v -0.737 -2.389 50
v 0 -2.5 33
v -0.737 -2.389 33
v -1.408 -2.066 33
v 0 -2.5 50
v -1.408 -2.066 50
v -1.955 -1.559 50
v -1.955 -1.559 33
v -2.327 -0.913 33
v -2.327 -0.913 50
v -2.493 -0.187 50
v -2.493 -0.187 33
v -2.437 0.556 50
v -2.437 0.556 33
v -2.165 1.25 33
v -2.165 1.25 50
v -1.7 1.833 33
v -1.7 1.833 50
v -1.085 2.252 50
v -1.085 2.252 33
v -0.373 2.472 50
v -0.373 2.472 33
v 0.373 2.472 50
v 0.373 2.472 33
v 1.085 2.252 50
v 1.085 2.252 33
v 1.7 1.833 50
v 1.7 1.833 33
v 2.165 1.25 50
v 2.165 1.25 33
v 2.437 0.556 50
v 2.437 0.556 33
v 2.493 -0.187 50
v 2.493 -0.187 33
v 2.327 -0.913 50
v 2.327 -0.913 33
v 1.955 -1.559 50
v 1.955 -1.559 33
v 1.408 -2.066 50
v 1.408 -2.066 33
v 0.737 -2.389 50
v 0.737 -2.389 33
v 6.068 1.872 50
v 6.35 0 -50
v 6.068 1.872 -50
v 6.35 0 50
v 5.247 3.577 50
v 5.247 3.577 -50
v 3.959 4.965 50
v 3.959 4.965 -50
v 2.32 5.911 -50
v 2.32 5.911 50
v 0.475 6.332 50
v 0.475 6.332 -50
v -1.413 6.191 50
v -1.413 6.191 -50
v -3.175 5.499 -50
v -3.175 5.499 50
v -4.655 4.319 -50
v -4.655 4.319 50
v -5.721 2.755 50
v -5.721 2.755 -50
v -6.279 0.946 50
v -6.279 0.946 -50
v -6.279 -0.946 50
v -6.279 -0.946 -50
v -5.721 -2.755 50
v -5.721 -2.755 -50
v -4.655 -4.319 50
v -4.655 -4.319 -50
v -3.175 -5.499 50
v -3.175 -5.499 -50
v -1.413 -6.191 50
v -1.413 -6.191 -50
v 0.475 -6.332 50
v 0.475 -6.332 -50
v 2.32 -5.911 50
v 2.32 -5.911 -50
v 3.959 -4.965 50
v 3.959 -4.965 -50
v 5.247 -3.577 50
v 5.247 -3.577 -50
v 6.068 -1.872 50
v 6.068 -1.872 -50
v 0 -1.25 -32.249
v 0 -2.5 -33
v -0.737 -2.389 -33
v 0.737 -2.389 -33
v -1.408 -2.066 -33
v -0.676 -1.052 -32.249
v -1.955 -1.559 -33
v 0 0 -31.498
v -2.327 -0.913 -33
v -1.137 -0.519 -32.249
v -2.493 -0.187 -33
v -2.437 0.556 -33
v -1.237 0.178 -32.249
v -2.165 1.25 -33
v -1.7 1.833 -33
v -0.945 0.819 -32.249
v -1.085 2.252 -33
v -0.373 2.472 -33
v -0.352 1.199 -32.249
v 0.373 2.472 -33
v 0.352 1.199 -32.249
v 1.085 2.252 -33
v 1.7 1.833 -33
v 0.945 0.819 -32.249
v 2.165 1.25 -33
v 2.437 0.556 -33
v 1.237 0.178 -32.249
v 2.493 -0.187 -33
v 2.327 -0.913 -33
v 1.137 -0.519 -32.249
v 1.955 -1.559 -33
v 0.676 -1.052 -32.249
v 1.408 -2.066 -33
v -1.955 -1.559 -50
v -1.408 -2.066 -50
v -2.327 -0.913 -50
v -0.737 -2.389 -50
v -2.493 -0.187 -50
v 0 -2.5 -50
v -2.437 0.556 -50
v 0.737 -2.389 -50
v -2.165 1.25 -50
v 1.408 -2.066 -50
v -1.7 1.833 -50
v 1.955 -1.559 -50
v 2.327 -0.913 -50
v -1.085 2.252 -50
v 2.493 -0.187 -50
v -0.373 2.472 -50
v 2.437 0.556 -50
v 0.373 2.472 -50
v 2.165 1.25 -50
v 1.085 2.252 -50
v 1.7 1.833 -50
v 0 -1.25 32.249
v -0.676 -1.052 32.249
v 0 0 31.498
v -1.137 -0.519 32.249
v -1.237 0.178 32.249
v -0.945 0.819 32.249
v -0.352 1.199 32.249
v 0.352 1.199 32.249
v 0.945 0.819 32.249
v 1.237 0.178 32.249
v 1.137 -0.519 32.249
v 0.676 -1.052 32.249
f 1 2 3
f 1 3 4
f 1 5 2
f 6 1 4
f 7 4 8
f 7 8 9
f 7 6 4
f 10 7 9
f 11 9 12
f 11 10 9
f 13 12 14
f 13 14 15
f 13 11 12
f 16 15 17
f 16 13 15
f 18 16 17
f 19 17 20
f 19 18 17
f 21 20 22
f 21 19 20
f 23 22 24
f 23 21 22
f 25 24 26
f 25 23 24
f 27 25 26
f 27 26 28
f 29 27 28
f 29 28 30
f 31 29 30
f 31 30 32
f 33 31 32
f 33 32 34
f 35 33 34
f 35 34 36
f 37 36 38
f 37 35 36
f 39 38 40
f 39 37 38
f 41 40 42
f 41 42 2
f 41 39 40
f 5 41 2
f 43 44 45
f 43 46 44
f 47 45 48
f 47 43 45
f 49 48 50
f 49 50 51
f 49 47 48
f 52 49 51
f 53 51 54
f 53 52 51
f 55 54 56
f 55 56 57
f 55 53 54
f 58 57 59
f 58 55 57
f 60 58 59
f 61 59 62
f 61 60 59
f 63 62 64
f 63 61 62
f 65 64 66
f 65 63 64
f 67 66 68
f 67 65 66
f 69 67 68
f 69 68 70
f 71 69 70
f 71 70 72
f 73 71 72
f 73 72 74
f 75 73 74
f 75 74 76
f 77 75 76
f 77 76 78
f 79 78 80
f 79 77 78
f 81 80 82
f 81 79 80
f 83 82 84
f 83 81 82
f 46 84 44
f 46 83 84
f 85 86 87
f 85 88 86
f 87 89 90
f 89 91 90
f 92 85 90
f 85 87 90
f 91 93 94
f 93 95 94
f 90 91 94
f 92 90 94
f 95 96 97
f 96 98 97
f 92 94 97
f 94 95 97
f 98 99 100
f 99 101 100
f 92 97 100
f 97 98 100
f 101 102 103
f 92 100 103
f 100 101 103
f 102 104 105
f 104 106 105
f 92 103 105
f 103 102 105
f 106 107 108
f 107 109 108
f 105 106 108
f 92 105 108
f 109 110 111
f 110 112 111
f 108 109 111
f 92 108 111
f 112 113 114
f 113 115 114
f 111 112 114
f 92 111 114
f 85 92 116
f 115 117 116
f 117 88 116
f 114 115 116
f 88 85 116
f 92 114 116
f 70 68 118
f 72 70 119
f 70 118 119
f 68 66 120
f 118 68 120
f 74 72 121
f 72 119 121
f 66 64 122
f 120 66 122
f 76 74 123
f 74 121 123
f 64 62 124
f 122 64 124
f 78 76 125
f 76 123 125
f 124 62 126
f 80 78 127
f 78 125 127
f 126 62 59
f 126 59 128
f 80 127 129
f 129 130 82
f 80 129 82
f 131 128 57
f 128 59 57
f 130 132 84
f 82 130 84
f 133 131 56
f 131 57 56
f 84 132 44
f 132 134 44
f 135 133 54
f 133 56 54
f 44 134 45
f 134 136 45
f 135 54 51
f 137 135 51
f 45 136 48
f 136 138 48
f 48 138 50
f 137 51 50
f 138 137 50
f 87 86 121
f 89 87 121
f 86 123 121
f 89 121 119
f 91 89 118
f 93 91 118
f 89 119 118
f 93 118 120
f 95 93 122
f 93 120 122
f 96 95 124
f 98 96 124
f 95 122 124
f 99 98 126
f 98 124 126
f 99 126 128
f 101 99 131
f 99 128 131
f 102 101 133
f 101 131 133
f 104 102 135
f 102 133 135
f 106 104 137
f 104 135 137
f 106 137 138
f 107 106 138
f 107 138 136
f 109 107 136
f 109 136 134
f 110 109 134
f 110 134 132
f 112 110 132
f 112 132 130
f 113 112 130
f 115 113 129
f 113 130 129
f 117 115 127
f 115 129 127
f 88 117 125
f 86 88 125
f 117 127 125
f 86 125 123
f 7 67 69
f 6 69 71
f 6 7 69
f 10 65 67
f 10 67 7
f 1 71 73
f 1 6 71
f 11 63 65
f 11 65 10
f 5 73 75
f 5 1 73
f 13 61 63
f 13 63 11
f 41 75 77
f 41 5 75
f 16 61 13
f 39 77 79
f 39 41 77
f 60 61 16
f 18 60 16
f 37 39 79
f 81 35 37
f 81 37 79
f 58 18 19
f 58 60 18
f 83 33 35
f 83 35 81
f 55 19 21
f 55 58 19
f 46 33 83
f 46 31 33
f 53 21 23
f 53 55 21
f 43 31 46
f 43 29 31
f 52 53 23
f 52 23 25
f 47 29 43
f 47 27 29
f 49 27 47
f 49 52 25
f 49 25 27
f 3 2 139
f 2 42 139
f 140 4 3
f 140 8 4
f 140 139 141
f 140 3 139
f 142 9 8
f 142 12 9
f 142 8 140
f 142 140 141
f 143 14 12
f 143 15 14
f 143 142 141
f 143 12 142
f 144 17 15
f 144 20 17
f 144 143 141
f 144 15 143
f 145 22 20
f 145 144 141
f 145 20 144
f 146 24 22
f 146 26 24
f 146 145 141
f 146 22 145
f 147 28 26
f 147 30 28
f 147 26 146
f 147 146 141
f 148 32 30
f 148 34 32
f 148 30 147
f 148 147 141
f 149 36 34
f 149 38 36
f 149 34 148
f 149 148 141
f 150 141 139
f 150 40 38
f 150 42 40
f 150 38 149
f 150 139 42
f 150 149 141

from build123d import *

# Parameters (mm, degrees)
CROQUIS1_R              = 6.35
SALIENTE_EXTRUIR1_DEPTH = 50


with BuildPart() as part:
    # Croquis1 → Saliente-Extruir1 (new, symmetric)
    with BuildSketch(Plane.XY):
        Circle(CROQUIS1_R)
    extrude(amount=SALIENTE_EXTRUIR1_DEPTH, both=True)

    # Croquis3 → Taladro roscado M61 (revolve, cut)
    with BuildSketch(Plane(origin=(0, 0, 50), x_dir=(0, -1, 0), z_dir=(1, 0, 0))):
        Polygon((0, 0), (0, 18.502151548), (2.5, 17), (2.5, 0), align=None)
    taladro_roscado_m61 = revolve(axis=Axis((0, 0, 56.35), (0, 0, -1)), mode=Mode.SUBTRACT)

    # Simetría1: Taladro roscado M61 across plane
    add(taladro_roscado_m61.mirror(Plane.XY), mode=Mode.SUBTRACT)


solid = part.part
